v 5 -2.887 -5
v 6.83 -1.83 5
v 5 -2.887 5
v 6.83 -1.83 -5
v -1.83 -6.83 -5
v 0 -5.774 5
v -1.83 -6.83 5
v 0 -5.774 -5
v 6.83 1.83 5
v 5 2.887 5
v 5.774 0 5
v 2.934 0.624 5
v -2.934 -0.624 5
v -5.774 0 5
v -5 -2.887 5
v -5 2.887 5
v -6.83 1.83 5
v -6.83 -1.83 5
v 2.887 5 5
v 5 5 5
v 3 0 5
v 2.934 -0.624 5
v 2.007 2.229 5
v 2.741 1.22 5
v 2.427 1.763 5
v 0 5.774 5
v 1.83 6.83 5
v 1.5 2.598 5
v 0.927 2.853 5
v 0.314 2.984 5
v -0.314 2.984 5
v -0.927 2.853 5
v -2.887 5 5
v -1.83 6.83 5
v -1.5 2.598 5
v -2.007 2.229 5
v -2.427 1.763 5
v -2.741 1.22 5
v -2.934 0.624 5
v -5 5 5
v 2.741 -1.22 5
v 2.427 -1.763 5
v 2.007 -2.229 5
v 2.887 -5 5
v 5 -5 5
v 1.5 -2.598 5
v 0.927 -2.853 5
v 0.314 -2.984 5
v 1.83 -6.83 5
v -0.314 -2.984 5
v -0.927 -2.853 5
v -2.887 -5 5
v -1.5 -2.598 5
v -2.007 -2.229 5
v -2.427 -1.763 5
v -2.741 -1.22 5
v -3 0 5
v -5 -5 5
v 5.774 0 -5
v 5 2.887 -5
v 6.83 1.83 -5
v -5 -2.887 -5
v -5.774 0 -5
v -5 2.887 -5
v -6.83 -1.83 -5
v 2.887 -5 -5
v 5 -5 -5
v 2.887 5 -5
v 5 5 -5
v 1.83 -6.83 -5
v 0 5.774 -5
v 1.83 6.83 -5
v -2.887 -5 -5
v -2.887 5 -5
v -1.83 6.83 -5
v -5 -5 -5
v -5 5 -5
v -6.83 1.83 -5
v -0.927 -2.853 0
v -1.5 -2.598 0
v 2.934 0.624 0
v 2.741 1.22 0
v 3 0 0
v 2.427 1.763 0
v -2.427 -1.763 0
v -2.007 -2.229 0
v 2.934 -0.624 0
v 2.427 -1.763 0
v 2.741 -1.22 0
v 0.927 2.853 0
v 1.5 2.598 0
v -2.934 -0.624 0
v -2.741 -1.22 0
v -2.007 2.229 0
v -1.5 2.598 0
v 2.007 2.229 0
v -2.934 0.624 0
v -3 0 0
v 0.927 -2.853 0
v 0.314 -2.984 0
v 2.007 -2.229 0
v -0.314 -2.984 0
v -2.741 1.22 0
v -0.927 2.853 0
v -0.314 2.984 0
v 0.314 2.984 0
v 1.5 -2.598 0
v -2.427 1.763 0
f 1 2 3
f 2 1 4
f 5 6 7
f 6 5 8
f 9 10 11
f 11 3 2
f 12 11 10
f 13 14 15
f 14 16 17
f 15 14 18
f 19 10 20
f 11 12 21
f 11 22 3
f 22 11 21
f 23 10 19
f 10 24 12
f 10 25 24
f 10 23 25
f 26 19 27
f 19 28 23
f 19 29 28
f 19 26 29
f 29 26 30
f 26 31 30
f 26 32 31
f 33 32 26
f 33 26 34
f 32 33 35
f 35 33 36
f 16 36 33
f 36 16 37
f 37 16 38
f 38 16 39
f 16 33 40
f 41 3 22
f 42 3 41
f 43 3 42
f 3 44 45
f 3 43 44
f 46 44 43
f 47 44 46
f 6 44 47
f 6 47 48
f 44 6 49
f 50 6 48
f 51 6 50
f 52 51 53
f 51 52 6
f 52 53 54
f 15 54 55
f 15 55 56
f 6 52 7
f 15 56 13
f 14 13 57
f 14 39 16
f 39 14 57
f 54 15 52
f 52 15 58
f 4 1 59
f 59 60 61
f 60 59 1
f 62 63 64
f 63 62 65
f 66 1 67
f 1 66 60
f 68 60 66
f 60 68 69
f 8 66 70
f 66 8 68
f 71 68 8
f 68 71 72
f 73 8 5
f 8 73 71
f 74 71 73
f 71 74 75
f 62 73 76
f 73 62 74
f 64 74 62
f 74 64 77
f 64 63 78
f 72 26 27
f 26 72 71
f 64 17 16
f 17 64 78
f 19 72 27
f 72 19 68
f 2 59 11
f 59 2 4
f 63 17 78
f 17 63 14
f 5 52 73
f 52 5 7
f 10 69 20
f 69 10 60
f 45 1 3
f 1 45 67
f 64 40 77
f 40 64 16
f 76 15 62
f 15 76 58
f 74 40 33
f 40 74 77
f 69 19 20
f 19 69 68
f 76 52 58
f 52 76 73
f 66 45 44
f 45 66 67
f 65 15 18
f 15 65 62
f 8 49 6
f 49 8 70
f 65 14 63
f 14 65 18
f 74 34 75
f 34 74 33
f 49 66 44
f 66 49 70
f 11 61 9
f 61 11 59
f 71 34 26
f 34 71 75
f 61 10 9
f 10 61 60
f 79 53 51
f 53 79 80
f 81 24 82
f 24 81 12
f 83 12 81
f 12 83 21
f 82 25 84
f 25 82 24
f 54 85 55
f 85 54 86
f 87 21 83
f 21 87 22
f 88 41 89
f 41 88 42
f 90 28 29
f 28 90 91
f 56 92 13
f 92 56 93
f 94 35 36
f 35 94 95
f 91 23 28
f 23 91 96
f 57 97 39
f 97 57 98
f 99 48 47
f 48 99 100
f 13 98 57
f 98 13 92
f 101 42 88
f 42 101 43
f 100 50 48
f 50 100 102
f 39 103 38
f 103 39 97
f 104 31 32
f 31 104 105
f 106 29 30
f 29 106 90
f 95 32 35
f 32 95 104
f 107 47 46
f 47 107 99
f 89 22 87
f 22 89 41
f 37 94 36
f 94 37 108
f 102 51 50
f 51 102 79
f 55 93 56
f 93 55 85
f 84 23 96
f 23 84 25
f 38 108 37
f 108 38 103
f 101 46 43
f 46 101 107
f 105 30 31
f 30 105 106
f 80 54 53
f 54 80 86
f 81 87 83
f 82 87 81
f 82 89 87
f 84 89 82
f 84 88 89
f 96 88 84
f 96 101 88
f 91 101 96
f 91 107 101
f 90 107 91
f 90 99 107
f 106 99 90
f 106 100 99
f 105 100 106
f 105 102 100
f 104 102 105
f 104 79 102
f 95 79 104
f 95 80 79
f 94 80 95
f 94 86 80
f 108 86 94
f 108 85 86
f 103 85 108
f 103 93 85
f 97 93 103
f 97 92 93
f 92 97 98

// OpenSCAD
difference() {
	for (r = [-60, 0, 60]) rotate([0,0,r]) cube([10, 10, 10], true);
	translate(10, 10, 0) cylinder(h = 12, r=3, $fs=36, $fn=30) ;
}
